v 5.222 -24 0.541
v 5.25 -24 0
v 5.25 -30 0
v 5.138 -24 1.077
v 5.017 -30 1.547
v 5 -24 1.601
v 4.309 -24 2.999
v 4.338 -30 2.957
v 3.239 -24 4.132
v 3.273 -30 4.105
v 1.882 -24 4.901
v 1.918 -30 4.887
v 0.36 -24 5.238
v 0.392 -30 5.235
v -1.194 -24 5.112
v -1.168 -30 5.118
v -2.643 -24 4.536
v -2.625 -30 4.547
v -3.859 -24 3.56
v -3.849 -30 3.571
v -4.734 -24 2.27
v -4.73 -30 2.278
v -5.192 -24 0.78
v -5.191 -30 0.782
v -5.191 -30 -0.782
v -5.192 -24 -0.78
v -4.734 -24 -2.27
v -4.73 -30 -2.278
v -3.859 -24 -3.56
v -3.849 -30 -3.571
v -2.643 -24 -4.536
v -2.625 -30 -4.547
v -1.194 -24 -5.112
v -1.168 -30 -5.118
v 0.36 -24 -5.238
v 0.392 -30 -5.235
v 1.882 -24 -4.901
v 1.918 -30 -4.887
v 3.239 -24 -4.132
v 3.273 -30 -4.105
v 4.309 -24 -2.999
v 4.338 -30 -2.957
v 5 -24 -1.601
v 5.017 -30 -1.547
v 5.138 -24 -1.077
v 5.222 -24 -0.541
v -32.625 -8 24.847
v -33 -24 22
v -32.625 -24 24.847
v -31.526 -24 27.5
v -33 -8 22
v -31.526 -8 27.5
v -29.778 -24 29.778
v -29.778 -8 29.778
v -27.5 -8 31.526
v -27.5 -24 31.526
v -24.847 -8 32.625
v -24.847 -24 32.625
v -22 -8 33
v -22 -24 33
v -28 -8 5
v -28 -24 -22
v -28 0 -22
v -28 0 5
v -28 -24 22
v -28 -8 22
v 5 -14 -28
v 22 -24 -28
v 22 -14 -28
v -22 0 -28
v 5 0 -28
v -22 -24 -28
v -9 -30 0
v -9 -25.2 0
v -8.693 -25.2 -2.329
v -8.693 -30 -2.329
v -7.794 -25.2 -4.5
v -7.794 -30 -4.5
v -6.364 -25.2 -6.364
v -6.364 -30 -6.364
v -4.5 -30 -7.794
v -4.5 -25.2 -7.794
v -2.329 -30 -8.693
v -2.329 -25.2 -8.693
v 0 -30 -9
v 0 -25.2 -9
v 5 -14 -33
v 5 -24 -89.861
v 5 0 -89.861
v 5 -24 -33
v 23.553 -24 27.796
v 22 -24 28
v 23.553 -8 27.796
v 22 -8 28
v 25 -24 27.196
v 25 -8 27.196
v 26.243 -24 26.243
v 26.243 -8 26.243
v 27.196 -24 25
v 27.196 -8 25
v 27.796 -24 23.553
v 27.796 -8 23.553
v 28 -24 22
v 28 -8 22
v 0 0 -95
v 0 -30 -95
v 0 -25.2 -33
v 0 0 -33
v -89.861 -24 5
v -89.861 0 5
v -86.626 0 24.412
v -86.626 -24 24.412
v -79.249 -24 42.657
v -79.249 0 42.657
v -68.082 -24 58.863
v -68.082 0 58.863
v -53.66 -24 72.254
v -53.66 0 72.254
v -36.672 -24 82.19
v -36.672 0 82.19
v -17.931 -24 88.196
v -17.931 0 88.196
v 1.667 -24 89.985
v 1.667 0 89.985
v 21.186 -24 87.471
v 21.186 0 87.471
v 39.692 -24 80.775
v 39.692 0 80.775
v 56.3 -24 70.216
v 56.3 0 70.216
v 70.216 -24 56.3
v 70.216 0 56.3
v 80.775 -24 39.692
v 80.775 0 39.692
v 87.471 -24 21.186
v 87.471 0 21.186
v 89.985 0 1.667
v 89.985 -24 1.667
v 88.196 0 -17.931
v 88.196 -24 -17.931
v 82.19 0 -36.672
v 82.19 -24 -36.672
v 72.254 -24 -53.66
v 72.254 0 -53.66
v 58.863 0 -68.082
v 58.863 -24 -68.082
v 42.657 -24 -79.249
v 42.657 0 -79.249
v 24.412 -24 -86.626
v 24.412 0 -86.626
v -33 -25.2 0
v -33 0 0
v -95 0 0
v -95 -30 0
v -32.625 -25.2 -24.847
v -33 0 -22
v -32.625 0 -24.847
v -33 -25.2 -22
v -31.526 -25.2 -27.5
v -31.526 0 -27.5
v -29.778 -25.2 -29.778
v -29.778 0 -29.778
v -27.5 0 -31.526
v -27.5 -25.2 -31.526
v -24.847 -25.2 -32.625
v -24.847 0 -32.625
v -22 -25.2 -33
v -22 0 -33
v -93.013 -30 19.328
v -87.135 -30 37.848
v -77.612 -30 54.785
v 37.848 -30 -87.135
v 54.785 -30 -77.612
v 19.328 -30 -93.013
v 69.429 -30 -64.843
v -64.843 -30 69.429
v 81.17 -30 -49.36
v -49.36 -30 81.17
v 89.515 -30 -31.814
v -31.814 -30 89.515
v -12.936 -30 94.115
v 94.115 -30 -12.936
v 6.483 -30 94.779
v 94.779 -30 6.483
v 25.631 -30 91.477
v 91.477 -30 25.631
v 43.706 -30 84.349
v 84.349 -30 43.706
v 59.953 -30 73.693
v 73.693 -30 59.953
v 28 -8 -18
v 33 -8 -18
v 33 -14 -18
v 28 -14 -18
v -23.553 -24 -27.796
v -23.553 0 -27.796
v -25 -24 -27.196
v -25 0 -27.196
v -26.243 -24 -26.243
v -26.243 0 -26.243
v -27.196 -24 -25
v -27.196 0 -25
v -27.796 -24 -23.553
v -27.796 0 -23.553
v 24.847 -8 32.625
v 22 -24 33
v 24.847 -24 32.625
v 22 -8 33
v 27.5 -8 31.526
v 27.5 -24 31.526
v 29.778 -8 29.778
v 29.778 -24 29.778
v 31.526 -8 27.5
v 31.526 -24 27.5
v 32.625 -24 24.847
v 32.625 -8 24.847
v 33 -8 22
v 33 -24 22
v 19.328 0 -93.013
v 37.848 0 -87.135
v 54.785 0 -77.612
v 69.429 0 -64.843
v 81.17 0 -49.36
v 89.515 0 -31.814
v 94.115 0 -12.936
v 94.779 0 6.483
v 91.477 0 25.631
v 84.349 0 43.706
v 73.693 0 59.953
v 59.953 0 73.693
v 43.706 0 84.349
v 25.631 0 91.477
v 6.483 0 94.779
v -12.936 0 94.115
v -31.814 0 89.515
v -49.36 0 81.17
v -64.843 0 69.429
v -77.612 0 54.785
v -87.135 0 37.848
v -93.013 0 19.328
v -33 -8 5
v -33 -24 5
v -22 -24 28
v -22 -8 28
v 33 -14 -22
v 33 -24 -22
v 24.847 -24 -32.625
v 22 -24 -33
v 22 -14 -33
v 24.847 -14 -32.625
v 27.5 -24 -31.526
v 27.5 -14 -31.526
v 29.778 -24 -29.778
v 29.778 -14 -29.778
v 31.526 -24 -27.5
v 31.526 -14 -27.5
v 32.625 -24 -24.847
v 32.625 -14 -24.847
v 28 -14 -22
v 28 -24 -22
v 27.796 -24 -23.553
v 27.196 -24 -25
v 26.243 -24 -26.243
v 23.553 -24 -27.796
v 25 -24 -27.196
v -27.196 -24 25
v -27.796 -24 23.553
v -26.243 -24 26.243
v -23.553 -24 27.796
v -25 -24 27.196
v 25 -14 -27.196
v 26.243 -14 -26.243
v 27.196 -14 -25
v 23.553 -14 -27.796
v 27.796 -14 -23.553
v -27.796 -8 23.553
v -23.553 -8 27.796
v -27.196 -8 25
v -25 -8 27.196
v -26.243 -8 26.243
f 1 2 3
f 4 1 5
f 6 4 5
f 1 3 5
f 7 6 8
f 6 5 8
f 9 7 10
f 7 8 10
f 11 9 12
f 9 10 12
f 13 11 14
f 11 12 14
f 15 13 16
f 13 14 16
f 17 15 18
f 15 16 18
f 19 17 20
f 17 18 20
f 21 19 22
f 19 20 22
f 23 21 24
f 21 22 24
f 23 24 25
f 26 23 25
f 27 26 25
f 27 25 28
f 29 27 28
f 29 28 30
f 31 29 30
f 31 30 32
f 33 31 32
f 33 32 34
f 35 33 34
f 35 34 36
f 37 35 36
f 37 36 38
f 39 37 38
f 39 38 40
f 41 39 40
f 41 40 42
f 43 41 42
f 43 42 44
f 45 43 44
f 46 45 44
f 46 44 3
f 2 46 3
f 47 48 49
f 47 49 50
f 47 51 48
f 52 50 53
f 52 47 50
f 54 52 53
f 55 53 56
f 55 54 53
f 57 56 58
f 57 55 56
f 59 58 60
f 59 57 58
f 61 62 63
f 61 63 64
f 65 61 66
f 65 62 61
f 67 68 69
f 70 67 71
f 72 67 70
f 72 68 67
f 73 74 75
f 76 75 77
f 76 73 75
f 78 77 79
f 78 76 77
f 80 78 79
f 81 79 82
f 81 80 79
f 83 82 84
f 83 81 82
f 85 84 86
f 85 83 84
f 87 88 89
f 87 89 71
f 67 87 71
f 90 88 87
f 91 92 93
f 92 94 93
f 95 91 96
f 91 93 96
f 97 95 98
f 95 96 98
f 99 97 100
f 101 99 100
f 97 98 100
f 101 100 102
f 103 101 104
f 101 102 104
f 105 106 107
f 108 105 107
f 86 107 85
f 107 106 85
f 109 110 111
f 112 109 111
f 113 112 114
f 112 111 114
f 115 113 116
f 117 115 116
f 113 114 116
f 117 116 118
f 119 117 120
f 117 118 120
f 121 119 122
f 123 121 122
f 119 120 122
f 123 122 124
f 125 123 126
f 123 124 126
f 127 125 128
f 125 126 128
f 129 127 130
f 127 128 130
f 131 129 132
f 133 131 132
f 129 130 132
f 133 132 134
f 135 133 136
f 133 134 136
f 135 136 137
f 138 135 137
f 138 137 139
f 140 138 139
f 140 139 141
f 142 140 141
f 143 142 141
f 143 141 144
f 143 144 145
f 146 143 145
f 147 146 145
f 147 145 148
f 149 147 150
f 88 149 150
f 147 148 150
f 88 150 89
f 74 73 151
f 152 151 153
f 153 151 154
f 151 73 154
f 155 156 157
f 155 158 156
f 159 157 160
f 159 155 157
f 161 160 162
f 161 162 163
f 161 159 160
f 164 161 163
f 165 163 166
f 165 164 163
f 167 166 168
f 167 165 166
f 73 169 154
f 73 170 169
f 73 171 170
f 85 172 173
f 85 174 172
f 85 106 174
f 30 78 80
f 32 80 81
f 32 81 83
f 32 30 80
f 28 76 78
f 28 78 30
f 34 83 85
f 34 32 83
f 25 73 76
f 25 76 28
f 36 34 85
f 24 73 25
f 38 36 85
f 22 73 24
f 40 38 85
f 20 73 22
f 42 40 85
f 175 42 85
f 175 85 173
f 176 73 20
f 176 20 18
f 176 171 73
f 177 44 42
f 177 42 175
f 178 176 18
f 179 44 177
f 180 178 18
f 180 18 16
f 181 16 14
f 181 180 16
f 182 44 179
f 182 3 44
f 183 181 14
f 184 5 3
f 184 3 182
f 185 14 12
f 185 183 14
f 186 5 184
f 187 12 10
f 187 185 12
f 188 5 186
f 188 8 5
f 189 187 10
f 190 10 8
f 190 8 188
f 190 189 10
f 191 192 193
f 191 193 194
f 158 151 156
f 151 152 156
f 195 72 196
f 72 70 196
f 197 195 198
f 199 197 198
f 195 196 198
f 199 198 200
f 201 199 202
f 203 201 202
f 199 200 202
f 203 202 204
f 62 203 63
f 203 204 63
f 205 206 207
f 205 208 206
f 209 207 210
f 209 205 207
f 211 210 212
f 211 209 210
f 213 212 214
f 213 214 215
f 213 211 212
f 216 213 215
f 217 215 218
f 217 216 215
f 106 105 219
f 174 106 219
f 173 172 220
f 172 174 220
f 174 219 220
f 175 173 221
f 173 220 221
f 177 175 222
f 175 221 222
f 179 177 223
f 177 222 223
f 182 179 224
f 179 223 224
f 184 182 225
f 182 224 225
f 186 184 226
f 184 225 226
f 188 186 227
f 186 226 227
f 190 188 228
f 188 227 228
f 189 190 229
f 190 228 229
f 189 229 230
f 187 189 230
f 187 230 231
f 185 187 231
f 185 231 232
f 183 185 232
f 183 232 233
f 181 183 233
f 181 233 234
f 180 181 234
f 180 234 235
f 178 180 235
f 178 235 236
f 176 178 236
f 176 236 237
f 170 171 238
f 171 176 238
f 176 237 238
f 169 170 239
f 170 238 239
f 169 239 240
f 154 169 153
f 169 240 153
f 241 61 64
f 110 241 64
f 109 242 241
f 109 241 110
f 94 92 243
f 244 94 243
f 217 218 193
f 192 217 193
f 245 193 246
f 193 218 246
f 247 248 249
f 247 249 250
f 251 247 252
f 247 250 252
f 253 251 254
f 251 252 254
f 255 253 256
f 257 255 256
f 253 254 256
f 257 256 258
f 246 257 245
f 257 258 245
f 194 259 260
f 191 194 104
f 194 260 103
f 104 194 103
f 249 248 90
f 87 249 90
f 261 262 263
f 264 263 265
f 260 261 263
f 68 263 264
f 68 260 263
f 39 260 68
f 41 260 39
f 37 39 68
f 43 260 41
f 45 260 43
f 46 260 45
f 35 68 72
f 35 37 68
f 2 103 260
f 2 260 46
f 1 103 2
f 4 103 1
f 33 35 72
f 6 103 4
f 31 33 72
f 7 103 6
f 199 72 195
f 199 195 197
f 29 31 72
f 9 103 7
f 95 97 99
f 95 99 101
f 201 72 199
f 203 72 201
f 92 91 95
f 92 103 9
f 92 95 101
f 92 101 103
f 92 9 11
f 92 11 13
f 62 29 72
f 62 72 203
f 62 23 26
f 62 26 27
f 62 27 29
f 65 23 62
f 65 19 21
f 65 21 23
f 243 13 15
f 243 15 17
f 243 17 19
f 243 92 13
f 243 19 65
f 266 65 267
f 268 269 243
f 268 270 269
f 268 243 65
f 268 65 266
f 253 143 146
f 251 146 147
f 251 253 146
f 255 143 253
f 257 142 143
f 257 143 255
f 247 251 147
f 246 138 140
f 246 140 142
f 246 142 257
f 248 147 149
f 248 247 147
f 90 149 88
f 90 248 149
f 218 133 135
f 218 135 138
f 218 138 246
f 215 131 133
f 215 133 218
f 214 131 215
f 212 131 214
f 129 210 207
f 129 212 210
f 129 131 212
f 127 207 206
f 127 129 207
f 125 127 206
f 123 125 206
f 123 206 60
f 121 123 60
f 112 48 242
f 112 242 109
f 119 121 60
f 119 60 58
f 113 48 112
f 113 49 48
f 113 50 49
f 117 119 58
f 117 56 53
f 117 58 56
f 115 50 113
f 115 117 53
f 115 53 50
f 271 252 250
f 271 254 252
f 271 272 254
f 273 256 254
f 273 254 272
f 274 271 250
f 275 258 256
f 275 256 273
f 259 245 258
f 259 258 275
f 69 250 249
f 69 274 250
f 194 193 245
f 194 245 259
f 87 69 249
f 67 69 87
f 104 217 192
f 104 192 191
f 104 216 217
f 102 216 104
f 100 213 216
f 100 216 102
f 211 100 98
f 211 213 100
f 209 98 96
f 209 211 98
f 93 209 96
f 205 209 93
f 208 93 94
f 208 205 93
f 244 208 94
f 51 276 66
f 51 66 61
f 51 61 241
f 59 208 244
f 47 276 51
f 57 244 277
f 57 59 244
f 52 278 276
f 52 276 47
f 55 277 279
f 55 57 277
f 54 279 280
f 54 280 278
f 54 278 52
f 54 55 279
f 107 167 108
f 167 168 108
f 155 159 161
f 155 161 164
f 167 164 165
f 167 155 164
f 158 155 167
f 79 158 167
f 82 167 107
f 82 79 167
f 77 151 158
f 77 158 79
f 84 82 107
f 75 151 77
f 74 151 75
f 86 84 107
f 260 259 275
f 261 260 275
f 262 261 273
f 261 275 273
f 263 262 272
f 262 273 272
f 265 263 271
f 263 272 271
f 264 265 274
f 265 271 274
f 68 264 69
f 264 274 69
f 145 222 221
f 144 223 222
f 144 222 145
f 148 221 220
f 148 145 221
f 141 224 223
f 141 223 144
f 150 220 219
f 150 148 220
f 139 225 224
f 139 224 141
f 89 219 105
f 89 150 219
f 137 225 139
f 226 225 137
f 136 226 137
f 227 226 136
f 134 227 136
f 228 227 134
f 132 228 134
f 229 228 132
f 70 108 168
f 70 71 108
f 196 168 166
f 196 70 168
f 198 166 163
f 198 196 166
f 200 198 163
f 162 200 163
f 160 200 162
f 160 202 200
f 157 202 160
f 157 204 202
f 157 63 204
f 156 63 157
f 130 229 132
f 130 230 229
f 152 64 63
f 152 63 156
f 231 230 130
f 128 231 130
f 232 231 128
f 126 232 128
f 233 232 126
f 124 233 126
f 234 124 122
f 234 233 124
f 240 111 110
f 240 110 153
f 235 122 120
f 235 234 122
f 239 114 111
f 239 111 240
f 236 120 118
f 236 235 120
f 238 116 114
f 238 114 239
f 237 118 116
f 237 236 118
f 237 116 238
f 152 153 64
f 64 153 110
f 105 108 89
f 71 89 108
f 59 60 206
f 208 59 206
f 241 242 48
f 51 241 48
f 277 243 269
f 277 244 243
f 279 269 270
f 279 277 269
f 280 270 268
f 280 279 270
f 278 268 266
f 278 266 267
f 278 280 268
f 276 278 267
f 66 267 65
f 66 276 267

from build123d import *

# Parameters (mm, degrees)
F0_R      = 95
F1_DEPTH  = 30
F2_W      = 95
F2_H      = 95
F3_DEPTH  = 40
F4_R      = 9
F5_DEPTH  = 30
F6_R      = 5.25
F7_DEPTH  = 40
F9_DEPTH  = 24
F10_W     = 56
F10_H     = 56
F10_W_2   = 57
F10_H_2   = 5
F10_W_3   = 5
F10_H_3   = 57
F11_DEPTH = 24
F13_DEPTH = 1.2
F15_DEPTH = 8
F16_R     = 6
F17_W     = 28
F17_H     = 15
F18_DEPTH = 6
F19_R     = 11


with BuildPart() as f1:
    # F0 (on Front) → F1 (new body)
    with BuildSketch(Plane.XZ):
        Circle(F0_R)
    extrude(amount=F1_DEPTH)

    # F2 (on face) → F3 (cut)
    with BuildSketch(Plane.XZ.offset(30)):
        with Locations((-47.5, -47.5)):
            Rectangle(F2_W, F2_H)
    extrude(amount=-F3_DEPTH, mode=Mode.SUBTRACT)

    # F4 (on face) → F5 (join)
    with BuildSketch(Plane.XZ.offset(30)):
        Circle(F4_R)
    extrude(amount=-F5_DEPTH)

    # F6 (on face) → F7 (cut)
    with BuildSketch(Plane.XZ.offset(30)):
        Circle(F6_R)
    extrude(amount=-F7_DEPTH, mode=Mode.SUBTRACT)

    # F8 (on face) → F9 (cut)
    with BuildSketch(Plane(origin=(0, 0, 0), x_dir=(-1, 0, 0), z_dir=(0, 1, 0))):
        with BuildLine():
            ThreePointArc((0, -9), (6.3639610307, -6.3639610307), (9, 0))
            Line((9, 0), (5.25, 0))
            ThreePointArc((5.25, 0), (3.7123106012, -3.7123106012), (0, -5.25))
            Line((0, -5.25), (0, -9))
        make_face()
        with BuildLine():
            ThreePointArc((0, -5.25), (3.7123106012, -3.7123106012), (5.25, 0))
            Line((5.25, 0), (0, 0))
            Line((0, 0), (0, -5.25))
        make_face()
        with BuildLine():
            ThreePointArc((-5, 1.6007810594), (-3.7123106012, 3.7123106012), (-1.6007810594, 5))
            Line((-1.6007810594, 5), (-5, 5))
            Line((-5, 5), (-5, 1.6007810594))
        make_face()
        with BuildLine():
            Line((-1.6007810594, 5), (1.6007810594, 5))
            ThreePointArc((1.6007810594, 5), (0, 5.25), (-1.6007810594, 5))
        make_face()
        with BuildLine():
            Line((1.6007810594, 5), (89.8610037781, 5))
            ThreePointArc((89.8610037781, 5), (-63.6396103068, 63.6396103068), (-5, -89.8610037781))
            Line((-5, -89.8610037781), (-5, -1.6007810594))
            ThreePointArc((-5, -1.6007810594), (-5.25, 0), (-5, 1.6007810594))
            Line((-5, 1.6007810594), (-5, 5))
            Line((-5, 5), (-1.6007810594, 5))
            ThreePointArc((-1.6007810594, 5), (0, 5.25), (1.6007810594, 5))
        make_face()
        with BuildLine():
            ThreePointArc((0, -90), (63.6396103068, -63.6396103068), (90, 0))
            Line((90, 0), (9, 0))
            ThreePointArc((9, 0), (6.3639610307, -6.3639610307), (0, -9))
            Line((0, -9), (0, -90))
        make_face()
        with BuildLine():
            Line((9, 0), (90, 0))
            ThreePointArc((90, 0), (89.9652442336, 2.5009658109), (89.8610037781, 5))
            Line((89.8610037781, 5), (1.6007810594, 5))
            ThreePointArc((1.6007810594, 5), (4.2406721496, 3.0950282259), (5.25, 0))
            Line((5.25, 0), (9, 0))
        make_face()
        with BuildLine():
            ThreePointArc((-5, -89.8610037781), (-2.5009658109, -89.9652442336), (0, -90))
            Line((0, -90), (0, -9))
            Line((0, -9), (0, -5.25))
            ThreePointArc((0, -5.25), (-3.0950282259, -4.2406721496), (-5, -1.6007810594))
            Line((-5, -1.6007810594), (-5, -89.8610037781))
        make_face()
        with BuildLine():
            ThreePointArc((5.25, 0), (4.2406721496, 3.0950282259), (1.6007810594, 5))
            Line((1.6007810594, 5), (-1.6007810594, 5))
            ThreePointArc((-1.6007810594, 5), (-3.7123106012, 3.7123106012), (-5, 1.6007810594))
            Line((-5, 1.6007810594), (-5, -1.6007810594))
            ThreePointArc((-5, -1.6007810594), (-3.0950282259, -4.2406721496), (0, -5.25))
            Line((0, -5.25), (0, 0))
            Line((0, 0), (5.25, 0))
        make_face()
    extrude(amount=-F9_DEPTH, mode=Mode.SUBTRACT)

    # F10 (on face) → F11 (join)
    with BuildSketch(Plane(origin=(0, -24, 0), x_dir=(-1, 0, 0), z_dir=(0, 1, 0))):
        Polygon((33, 5), (33, 33), (-33, 33), (-33, -33), (-5, -33), (0, -33), (33, -33), (33, 0), align=None)
        Rectangle(F10_W, F10_H, mode=Mode.SUBTRACT)
        with Locations((61.5, 2.5)):
            Rectangle(F10_W_2, F10_H_2)
        with Locations((-2.5, -61.5)):
            Rectangle(F10_W_3, F10_H_3)
    extrude(amount=F11_DEPTH)

    # F12 (on face) → F13 (join)
    with BuildSketch(Plane.XZ.offset(24)):
        with BuildLine():
            Line((-28, 0), (-28, -28))
            Line((-28, -28), (0, -28))
            Line((0, -28), (0, -9))
            ThreePointArc((0, -9), (-6.3639610307, -6.3639610307), (-9, 0))
            Line((-9, 0), (-28, 0))
        make_face()
        Polygon((0, -28), (-28, -28), (-28, 0), (-33, 0), (-33, -33), (0, -33), align=None)
    extrude(amount=F13_DEPTH)

    # F14 (on face) → F15 (cut)
    with BuildSketch(Plane(origin=(0, 0, 0), x_dir=(-1, 0, 0), z_dir=(0, 1, 0))):
        Polygon((33, 33), (-33, 33), (-33, -33), (-5, -33), (-5, -28), (-28, -28), (-28, 28), (28, 28), (28, 5), (33, 5), align=None)
    extrude(amount=-F15_DEPTH, mode=Mode.SUBTRACT)

    # F16
    f16_edges = [f1.edges().sort_by_distance(p)[0] for p in [
        (-28, -12, -28),
        (28, -16, -28),
        (28, -16, 28),
        (-28, -16, 28),
    ]]
    fillet(f16_edges, radius=F16_R)

    # F17 (on face) → F18 (cut)
    with BuildSketch(Plane(origin=(0, -8, 0), x_dir=(-1, 0, 0), z_dir=(0, 1, 0))):
        with Locations((-19, -25.5)):
            Rectangle(F17_W, F17_H)
    extrude(amount=-F18_DEPTH, mode=Mode.SUBTRACT)

    # F19
    f19_edges = [f1.edges().sort_by_distance(p)[0] for p in [
        (33, -19, -33),
        (-33, -12.6, -33),
        (33, -16, 33),
        (-33, -16, 33),
    ]]
    fillet(f19_edges, radius=F19_R)


solid = f1.part
